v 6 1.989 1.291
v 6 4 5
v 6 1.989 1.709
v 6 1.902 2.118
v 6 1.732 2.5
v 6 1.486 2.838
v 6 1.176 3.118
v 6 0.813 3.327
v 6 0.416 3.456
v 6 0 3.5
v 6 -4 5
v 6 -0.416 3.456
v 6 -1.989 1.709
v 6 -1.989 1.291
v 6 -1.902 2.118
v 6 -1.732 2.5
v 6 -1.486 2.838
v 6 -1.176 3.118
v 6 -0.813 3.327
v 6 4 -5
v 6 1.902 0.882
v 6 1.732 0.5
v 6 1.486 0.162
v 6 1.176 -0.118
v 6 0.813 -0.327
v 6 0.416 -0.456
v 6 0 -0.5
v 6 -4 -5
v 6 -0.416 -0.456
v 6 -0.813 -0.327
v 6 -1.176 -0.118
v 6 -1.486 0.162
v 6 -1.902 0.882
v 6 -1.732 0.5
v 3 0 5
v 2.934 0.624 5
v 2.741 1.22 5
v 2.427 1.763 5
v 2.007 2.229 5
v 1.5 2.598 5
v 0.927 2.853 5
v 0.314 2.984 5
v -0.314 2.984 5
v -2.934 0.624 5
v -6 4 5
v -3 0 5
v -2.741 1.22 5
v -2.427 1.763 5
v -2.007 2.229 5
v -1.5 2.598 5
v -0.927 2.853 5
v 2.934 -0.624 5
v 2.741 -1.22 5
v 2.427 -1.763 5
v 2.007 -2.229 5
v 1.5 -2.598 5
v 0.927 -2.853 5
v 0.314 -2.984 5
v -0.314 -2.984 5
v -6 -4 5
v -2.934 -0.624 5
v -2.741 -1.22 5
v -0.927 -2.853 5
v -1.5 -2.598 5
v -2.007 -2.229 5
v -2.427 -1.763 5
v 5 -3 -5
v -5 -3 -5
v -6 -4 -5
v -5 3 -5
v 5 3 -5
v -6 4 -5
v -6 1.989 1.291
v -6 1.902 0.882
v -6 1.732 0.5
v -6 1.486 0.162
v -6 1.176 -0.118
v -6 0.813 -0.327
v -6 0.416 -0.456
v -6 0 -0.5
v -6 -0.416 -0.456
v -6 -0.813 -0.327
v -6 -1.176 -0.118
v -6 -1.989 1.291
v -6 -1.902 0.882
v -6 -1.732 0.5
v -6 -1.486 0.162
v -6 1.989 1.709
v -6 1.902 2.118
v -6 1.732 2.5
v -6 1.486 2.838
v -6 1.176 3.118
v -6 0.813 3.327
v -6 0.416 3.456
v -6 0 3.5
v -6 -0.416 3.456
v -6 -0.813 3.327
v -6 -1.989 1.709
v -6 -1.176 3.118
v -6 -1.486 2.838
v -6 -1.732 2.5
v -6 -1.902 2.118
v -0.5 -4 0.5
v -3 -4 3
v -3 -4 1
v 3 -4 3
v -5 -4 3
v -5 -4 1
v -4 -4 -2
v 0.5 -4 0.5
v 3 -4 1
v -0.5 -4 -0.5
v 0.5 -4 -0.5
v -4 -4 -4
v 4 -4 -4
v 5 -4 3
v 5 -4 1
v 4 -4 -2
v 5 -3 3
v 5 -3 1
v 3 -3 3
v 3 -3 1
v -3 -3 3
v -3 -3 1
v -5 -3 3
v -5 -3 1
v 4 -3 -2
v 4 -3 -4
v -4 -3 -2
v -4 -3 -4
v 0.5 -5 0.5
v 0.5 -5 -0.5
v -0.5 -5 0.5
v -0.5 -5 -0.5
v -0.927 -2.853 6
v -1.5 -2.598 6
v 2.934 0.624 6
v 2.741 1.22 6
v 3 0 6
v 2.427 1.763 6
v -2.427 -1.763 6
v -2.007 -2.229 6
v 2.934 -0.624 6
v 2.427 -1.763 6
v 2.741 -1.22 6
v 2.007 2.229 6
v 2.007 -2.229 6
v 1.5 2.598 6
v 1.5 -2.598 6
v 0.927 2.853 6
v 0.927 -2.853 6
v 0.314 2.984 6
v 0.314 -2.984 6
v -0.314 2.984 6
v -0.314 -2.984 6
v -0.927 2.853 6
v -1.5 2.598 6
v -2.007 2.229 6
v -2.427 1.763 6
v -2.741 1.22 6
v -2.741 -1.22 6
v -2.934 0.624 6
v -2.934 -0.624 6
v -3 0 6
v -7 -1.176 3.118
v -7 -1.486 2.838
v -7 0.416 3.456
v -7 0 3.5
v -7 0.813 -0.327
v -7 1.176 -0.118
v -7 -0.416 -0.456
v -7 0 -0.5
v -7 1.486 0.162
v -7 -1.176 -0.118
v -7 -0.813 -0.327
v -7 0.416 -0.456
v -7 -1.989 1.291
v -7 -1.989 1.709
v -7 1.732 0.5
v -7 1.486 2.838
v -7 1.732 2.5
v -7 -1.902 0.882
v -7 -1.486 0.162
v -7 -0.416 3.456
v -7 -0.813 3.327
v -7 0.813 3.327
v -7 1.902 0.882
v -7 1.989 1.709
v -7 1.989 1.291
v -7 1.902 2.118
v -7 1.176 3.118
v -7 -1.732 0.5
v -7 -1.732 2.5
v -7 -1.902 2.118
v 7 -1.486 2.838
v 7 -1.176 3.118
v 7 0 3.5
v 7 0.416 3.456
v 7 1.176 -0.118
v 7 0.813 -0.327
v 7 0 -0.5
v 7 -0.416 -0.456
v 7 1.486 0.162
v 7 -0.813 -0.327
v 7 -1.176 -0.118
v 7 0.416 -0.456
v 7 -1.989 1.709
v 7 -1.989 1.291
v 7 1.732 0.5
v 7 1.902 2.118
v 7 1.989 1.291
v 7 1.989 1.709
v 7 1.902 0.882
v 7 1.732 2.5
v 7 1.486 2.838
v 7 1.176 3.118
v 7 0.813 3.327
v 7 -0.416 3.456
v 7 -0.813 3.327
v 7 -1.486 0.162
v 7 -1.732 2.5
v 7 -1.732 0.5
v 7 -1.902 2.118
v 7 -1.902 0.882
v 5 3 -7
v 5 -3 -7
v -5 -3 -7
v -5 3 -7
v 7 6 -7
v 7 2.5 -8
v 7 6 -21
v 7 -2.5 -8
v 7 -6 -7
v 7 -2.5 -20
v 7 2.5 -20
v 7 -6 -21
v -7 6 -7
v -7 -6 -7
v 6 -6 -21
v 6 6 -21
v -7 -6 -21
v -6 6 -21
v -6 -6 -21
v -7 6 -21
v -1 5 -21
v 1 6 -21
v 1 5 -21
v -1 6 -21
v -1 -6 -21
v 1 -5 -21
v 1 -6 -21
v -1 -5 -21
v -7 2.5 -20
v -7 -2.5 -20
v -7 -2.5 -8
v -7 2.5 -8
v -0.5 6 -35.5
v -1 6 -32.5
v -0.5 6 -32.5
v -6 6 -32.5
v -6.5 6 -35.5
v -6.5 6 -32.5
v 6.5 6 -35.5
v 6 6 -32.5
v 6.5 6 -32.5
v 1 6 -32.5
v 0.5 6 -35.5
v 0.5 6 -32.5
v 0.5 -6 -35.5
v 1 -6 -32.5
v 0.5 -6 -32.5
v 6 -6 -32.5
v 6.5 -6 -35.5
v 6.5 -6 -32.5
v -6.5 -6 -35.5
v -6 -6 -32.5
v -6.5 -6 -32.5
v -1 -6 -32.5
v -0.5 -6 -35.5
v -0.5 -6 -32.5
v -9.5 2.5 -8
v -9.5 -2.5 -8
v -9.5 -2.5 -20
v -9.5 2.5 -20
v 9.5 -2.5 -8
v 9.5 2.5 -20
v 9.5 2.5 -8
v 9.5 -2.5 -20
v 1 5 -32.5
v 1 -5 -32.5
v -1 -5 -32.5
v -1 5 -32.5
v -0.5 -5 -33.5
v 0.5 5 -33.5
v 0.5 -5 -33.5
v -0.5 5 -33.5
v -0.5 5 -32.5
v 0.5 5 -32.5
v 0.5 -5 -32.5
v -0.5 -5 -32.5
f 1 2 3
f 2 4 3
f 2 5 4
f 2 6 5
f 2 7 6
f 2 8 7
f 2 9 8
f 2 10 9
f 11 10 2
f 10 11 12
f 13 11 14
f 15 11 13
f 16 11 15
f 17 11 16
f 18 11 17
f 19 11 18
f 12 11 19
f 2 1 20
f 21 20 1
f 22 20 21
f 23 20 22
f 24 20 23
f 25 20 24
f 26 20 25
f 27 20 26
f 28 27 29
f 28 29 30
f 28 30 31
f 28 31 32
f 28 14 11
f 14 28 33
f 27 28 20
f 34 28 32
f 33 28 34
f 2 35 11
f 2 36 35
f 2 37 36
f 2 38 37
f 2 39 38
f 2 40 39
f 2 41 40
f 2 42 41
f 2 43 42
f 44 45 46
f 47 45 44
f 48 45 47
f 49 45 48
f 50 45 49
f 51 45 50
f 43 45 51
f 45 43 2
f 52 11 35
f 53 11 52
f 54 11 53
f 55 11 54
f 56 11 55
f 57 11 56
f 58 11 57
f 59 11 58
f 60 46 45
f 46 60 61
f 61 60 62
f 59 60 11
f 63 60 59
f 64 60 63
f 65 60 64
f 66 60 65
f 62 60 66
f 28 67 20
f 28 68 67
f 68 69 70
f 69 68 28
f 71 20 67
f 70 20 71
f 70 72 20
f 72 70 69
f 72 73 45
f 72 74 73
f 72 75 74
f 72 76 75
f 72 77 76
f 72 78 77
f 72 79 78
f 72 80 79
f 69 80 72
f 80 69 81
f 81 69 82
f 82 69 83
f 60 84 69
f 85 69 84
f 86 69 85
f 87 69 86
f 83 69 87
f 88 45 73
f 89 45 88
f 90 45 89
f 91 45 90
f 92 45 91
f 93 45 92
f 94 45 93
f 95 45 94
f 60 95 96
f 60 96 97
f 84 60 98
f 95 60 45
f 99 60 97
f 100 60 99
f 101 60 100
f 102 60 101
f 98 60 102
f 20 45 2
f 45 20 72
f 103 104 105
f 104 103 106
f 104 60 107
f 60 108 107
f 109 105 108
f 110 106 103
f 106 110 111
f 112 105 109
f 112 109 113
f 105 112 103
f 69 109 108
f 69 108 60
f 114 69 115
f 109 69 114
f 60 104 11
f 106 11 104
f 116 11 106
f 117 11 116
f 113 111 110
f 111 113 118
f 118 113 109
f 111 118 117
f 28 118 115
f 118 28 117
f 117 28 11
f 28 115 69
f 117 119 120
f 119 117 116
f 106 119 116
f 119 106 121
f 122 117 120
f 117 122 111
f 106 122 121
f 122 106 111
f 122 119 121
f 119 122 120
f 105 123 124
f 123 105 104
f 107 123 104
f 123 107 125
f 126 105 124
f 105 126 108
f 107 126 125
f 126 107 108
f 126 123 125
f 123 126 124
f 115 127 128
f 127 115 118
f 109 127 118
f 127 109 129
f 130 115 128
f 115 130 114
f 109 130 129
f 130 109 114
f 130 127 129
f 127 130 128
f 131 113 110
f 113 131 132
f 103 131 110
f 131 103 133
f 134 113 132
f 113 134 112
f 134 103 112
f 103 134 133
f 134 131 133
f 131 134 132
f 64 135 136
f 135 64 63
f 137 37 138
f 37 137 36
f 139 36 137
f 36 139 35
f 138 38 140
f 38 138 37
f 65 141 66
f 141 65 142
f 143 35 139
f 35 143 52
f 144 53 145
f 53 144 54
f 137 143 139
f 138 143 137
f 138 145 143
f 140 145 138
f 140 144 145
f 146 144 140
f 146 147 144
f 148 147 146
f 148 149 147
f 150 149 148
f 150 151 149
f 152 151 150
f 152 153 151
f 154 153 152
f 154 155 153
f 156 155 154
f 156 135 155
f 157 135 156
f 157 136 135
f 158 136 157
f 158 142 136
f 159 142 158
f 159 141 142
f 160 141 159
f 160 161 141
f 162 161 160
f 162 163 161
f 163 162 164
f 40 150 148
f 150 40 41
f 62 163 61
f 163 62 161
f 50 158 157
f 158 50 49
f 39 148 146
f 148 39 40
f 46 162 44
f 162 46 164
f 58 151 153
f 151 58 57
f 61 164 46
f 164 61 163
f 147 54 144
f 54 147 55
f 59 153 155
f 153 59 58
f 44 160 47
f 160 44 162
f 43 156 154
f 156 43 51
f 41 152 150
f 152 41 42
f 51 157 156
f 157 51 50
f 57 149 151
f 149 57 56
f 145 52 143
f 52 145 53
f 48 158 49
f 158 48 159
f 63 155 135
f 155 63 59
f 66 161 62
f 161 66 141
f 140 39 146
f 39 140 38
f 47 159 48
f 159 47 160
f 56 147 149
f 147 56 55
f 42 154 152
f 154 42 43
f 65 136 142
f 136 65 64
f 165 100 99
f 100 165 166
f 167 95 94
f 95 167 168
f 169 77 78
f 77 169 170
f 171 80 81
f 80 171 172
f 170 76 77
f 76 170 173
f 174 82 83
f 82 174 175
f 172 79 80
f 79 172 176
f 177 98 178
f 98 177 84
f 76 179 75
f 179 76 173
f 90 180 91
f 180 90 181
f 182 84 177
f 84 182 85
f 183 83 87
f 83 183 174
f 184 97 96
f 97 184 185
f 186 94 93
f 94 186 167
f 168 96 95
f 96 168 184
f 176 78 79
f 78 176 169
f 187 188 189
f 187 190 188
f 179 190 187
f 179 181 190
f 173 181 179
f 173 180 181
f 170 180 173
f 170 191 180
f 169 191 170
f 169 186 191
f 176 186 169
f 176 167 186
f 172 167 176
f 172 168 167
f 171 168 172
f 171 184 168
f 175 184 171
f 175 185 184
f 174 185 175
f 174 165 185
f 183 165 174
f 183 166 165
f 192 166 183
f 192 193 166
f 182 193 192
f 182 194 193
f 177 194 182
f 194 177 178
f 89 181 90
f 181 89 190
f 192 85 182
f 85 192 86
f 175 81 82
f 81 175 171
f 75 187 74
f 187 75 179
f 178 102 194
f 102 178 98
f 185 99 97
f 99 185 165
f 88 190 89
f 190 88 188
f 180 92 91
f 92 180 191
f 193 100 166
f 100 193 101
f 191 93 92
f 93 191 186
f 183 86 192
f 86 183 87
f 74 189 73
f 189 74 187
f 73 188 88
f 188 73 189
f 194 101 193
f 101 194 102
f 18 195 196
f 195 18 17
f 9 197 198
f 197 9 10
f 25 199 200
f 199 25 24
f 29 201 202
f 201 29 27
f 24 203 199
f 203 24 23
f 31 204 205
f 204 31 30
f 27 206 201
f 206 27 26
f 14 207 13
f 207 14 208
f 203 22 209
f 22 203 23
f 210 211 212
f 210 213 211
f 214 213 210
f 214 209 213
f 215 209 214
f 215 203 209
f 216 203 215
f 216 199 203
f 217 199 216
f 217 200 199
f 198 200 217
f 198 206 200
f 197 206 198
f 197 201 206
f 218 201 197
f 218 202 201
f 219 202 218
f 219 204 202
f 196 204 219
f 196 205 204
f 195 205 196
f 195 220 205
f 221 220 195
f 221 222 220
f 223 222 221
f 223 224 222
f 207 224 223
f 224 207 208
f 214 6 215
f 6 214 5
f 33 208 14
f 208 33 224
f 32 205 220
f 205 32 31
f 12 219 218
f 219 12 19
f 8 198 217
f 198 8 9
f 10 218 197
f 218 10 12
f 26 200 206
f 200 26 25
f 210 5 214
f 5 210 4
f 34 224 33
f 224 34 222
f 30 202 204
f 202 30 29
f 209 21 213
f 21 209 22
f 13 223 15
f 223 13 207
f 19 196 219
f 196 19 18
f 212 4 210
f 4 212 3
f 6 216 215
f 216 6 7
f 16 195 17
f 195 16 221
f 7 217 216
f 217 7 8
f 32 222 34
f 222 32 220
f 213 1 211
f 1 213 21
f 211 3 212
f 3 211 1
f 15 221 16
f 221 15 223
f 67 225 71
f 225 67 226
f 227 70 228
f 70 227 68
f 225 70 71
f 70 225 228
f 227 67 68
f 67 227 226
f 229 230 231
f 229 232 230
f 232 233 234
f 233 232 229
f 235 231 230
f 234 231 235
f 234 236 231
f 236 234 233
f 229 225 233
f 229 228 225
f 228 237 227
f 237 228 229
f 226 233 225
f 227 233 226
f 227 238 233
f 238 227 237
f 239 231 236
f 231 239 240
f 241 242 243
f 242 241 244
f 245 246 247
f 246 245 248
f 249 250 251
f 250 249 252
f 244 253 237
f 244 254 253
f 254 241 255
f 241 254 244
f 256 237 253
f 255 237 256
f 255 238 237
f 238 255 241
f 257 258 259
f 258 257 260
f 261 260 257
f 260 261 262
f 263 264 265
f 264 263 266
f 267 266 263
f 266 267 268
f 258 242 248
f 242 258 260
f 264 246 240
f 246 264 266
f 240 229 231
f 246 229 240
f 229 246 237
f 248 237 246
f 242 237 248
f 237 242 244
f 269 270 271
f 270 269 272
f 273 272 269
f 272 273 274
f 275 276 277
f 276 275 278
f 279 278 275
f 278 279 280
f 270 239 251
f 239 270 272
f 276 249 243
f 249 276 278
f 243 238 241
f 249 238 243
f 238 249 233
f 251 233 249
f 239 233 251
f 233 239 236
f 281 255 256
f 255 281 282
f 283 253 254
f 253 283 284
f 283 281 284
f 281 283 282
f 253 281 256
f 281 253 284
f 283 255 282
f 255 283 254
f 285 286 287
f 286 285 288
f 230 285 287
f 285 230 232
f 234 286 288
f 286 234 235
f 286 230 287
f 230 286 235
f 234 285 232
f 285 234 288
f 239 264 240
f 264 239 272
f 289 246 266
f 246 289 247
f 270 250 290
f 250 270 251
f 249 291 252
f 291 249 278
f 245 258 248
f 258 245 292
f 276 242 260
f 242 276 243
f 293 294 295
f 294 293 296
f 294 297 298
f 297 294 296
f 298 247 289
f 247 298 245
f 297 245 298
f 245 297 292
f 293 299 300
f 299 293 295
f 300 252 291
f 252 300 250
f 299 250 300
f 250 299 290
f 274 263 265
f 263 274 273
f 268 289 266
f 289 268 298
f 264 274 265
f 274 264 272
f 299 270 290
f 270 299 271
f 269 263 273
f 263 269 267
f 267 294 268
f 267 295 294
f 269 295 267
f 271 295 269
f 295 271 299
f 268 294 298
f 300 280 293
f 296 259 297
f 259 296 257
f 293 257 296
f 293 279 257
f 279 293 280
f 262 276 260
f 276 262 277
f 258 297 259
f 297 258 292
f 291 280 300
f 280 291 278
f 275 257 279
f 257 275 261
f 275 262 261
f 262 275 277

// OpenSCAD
//Head
difference() {
	cube(size = [12,8,10], center = true);
	translate([3,-5,1]) cube(2);
	translate([-5,-5,1]) cube(2);
	translate([0,-5,-3]) cube(size = [8,4,2], center = true);
}


translate([-0.5,-5,-0.5]) cube(1);


cylinder(h = 6, r=3, $fs=36, $fn=30);

rotate(a=[0,90,0]) translate([-1.5,0,-7]) cylinder(h = 2, r=2, $fs=36, $fn=30);
rotate(a=[0,90,0]) translate([-1.5,0,5]) cylinder(h = 2, r=2, $fs=36, $fn=30);

// Neck
translate([0,0,-7]) cube(size = [10,6,4], center = true);


//Body
translate([0,0,-14]) cube(size = [14,12,14], center = true);

// Arm
translate([-7,0,-14]) cube(size = [5,5,12], center = true);
translate([7,0,-14]) cube(size = [5,5,12], center = true);

//Leg
translate([3.5,0,-24]) cube(size = [5,12,18], center = true);
translate([-3.5,0,-24]) cube(size = [5,12,18], center = true);
translate([0,0,-24]) cube(size = [6,10,19], center = true);

// Feet
translate([3.5,0,-34]) cube(size = [6,12,3], center = true);
translate([-3.5,0,-34]) cube(size = [6,12,3], center = true);
